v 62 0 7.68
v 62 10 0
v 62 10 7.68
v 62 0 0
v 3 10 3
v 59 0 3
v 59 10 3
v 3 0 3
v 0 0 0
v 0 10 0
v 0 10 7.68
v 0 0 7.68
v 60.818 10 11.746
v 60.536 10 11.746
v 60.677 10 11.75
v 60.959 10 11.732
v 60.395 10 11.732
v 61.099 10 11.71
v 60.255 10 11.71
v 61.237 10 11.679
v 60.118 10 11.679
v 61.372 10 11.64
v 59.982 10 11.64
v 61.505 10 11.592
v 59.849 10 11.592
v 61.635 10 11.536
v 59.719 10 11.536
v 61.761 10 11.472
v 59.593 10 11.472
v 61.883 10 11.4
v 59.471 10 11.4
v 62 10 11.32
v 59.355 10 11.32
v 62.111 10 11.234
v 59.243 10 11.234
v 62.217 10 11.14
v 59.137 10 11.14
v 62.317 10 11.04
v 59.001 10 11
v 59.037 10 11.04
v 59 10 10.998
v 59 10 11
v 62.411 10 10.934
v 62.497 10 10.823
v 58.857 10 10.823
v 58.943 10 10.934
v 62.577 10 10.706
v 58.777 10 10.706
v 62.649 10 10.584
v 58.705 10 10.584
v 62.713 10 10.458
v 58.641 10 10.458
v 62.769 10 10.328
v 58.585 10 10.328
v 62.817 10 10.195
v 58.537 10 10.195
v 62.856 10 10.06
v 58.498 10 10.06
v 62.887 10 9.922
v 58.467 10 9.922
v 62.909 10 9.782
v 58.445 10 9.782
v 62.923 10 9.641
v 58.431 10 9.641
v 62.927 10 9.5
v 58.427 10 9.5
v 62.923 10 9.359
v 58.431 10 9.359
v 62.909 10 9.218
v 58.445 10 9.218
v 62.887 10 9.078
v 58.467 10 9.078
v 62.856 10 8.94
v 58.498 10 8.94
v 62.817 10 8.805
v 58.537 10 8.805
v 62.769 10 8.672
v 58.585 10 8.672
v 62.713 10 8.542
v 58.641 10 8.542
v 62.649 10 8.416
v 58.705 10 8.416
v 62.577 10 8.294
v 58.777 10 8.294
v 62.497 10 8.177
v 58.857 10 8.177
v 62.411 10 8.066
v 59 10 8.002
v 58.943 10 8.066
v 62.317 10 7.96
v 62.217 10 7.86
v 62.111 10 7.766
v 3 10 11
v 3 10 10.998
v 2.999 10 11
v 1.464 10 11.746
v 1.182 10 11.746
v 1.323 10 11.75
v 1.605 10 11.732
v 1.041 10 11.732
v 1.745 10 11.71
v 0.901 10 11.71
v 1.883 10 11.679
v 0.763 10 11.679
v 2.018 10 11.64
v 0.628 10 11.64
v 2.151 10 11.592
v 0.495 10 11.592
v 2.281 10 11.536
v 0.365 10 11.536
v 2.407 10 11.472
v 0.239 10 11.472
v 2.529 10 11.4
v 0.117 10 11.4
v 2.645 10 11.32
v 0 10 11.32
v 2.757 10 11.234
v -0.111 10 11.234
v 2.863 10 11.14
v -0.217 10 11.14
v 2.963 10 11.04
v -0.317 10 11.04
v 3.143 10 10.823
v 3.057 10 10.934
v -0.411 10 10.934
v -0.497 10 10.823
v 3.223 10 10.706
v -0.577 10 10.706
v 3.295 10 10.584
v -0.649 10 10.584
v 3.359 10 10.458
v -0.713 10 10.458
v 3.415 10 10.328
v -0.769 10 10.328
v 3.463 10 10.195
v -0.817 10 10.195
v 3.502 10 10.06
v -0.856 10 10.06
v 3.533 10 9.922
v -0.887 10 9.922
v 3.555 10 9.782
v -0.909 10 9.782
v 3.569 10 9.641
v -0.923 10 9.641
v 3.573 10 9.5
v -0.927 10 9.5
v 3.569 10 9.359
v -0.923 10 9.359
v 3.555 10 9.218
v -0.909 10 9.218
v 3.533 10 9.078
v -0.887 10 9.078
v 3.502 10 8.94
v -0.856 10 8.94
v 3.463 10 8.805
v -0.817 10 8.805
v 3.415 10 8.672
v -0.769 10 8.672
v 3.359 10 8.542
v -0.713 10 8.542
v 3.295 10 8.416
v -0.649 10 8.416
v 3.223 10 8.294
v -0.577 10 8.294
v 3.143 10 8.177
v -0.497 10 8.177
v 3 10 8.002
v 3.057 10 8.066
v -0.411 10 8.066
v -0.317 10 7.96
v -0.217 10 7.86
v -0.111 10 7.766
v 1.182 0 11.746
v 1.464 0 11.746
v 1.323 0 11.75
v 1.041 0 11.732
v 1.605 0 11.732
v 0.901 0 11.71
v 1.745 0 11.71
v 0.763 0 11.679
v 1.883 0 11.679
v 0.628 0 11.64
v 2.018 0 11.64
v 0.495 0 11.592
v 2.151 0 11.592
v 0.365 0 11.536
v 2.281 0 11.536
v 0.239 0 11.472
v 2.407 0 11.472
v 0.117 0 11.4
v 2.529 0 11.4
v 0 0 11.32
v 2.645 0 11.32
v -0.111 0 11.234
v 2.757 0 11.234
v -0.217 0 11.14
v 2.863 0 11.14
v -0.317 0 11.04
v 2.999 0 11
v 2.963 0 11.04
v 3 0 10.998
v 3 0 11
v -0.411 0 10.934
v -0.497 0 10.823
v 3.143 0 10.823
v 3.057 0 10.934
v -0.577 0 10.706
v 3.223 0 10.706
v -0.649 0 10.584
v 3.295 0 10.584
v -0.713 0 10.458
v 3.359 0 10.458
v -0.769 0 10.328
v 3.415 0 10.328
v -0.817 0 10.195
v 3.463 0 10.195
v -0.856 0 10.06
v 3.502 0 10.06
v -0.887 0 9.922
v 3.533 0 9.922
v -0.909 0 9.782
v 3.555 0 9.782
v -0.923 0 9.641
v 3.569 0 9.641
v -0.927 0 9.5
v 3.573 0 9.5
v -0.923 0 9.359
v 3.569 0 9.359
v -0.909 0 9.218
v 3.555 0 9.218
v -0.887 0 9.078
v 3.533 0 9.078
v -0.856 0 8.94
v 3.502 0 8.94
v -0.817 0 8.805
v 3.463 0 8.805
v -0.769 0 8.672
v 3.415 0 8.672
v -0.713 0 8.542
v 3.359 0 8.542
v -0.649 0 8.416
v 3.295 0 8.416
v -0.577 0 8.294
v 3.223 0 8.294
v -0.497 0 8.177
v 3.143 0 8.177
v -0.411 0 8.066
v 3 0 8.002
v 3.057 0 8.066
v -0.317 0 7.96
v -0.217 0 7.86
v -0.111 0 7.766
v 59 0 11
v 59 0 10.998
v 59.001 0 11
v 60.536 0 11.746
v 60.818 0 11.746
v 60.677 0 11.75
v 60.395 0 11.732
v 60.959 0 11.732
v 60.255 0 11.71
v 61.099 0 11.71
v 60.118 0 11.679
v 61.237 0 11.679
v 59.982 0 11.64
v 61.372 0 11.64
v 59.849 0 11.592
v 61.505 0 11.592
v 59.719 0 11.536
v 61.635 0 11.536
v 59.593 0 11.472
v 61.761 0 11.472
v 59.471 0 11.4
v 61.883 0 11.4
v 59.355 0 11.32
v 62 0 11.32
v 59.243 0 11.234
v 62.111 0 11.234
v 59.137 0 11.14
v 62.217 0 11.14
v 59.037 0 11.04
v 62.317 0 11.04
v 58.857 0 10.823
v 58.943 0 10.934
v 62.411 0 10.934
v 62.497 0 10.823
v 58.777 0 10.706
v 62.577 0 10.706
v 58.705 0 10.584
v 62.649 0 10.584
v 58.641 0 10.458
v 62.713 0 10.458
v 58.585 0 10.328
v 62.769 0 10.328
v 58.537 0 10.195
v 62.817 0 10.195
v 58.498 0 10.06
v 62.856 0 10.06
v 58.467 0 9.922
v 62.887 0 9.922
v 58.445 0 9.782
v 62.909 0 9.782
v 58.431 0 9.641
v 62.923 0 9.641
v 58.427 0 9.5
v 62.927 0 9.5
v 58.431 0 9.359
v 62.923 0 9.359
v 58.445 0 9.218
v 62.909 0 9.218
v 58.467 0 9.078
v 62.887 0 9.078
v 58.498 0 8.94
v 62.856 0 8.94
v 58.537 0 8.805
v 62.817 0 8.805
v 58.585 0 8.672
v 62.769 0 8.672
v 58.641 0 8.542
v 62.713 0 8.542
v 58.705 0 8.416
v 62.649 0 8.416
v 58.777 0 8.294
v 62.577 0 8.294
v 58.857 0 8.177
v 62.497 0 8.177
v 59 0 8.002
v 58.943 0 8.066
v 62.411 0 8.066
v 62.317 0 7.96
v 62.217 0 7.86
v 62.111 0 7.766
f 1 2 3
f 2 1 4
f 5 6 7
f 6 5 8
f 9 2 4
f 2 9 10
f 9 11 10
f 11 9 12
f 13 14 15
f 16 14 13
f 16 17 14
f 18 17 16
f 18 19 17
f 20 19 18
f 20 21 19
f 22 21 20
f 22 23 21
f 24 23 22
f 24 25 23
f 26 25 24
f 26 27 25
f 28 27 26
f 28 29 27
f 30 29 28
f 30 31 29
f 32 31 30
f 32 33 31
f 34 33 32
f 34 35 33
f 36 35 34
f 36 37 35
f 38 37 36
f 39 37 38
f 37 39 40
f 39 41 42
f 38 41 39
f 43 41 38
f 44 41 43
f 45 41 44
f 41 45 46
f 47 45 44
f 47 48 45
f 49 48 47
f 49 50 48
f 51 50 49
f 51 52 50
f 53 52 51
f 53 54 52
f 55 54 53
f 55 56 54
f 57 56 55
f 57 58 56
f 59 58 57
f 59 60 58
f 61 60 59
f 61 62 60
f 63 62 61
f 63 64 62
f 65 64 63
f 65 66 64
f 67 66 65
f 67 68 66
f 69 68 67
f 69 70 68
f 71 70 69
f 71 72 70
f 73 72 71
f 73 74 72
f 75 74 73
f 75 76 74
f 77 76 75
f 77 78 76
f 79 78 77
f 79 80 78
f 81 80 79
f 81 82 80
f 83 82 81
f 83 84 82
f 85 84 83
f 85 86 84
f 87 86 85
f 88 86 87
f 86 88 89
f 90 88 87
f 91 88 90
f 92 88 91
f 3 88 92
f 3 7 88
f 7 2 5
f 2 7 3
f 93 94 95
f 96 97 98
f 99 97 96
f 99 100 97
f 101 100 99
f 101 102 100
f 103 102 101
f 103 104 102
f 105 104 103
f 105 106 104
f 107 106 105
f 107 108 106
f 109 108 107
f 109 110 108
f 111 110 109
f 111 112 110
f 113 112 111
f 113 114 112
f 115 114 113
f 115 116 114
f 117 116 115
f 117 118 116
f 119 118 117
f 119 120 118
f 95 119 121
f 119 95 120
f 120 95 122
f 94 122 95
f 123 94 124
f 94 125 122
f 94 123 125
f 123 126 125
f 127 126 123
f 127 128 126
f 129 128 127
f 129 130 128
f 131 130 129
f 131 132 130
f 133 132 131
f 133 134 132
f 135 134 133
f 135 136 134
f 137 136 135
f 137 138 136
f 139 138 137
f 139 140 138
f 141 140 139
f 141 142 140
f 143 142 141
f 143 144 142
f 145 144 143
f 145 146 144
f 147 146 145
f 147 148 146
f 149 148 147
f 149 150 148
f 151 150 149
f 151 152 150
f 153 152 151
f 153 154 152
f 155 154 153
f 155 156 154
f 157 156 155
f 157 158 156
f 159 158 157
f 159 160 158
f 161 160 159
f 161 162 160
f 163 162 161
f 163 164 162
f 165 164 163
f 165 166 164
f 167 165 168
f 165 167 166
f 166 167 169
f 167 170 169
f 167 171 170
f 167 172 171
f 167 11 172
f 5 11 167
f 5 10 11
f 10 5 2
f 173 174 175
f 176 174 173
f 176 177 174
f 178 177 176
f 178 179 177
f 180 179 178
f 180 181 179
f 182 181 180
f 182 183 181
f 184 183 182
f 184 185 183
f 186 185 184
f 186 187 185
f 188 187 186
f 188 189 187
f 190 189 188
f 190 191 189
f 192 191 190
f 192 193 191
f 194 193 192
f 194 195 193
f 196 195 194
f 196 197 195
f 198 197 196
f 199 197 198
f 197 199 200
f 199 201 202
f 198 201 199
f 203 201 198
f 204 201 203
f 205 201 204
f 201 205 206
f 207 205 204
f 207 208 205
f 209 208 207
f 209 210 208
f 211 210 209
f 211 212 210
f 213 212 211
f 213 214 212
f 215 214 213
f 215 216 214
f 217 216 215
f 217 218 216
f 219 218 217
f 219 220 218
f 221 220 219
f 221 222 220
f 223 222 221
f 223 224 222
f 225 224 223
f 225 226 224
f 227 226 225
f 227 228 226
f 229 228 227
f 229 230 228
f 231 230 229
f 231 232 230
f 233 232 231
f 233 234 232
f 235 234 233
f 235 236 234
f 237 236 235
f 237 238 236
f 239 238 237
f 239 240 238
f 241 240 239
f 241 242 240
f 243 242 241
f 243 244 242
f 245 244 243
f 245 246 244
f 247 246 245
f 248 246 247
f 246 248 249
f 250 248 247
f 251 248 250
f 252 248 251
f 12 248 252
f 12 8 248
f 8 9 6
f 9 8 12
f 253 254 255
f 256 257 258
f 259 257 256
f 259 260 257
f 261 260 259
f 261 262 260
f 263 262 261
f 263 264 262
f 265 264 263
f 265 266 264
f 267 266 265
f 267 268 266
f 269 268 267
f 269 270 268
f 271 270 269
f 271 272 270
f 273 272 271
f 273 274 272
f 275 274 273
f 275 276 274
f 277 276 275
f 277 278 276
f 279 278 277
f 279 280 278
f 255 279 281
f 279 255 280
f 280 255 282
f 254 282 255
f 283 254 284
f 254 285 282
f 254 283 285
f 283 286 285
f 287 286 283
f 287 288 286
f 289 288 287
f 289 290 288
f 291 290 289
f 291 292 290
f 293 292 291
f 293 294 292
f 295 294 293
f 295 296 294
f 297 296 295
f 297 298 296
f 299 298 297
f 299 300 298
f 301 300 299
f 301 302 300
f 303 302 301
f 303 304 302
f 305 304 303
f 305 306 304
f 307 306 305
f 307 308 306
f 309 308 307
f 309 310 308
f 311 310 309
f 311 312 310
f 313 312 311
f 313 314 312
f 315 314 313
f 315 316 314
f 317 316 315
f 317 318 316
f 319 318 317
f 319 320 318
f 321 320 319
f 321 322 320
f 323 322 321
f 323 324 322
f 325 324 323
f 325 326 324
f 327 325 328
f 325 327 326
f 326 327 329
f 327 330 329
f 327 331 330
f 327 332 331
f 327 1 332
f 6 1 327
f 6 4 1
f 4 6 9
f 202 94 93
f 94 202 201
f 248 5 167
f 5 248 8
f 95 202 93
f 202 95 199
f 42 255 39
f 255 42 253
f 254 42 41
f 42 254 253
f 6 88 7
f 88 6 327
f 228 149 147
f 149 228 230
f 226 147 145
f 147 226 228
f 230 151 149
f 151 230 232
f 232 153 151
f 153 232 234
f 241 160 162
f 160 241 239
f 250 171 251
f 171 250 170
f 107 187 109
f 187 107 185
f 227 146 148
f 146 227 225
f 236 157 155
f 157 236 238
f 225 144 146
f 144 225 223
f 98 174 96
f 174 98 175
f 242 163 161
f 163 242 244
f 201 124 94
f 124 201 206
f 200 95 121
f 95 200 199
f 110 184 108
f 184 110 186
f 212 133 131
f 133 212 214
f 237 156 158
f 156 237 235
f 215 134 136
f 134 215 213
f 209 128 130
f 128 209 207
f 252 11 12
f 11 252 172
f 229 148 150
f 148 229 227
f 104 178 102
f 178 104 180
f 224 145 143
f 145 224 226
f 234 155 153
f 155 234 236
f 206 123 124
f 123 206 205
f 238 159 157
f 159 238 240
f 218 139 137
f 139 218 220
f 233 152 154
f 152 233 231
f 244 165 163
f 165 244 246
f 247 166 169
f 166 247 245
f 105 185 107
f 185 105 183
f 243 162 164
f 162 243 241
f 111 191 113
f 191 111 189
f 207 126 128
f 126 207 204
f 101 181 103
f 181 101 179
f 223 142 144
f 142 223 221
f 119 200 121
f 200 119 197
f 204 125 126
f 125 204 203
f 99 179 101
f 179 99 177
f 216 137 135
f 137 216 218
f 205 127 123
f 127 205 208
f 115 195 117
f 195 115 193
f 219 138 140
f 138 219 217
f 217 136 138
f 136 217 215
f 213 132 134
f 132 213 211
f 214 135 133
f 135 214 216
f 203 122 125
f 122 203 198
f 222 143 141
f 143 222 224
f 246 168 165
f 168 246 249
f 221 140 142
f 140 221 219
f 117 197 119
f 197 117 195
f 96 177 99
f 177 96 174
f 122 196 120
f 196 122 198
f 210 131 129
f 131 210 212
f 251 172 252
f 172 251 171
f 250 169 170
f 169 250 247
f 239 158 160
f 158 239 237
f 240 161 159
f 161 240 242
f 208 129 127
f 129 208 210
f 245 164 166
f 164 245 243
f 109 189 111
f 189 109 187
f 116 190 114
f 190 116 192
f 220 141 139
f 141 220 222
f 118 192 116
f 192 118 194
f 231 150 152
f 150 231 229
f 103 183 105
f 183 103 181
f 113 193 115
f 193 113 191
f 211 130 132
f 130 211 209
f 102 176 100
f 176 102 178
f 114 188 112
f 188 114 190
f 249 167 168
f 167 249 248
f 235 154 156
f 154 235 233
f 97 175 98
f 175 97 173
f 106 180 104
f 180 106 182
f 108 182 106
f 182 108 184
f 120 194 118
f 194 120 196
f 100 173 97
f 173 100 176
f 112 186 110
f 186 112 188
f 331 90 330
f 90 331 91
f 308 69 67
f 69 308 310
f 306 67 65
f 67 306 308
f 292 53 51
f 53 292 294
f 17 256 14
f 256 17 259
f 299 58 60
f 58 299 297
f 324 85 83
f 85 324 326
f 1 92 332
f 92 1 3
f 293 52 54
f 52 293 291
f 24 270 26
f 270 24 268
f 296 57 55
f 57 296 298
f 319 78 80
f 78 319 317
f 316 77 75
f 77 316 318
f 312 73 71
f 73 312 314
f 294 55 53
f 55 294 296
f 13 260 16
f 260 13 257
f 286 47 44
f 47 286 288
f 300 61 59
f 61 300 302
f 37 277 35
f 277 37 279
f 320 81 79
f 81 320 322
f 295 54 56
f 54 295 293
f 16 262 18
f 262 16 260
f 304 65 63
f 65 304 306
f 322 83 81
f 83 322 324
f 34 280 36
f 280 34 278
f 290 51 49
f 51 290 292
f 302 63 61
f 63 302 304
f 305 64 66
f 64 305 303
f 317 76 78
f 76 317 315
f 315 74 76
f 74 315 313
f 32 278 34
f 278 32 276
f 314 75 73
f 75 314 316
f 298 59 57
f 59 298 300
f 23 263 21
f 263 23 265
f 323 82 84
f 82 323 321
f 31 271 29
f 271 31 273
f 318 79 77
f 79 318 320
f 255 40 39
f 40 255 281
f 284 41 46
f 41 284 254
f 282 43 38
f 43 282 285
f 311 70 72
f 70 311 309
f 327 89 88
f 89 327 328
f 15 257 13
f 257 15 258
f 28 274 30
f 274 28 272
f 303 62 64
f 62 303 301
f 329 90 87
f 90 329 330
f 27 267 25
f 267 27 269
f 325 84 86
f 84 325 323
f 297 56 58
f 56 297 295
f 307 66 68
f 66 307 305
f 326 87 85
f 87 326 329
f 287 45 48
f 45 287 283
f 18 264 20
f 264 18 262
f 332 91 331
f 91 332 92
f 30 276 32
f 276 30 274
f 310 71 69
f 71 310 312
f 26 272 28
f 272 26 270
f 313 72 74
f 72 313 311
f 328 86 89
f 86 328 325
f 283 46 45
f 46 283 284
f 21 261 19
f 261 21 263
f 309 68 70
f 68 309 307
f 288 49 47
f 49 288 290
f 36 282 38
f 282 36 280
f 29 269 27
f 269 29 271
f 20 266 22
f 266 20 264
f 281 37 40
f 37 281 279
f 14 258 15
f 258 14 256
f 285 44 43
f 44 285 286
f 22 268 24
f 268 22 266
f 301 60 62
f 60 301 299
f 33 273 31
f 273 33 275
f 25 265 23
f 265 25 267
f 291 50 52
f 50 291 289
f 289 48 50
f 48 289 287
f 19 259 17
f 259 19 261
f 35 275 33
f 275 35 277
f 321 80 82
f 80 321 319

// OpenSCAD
l_base = 55;
d_base = 5;
a_paredes = 3;
tol = 0.5;

cube( [ l_base + 2 * a_paredes + 2 * tol, 10, a_paredes ] );

cube( [ a_paredes, 10, 2 * a_paredes + d_base ] );
translate( [ l_base + a_paredes + 2 * tol, 0, 0 ] ) {
    cube( [ a_paredes, 10, 2 * a_paredes + d_base ] );
}

d_lombada = a_paredes * 1.5;

x_dis = 0.5 * sqrt( d_lombada ^ 2 - ( a_paredes ) ^ 2 );

translate( [ a_paredes - x_dis, 0, 2 * a_paredes + d_base - d_lombada / 2 + d_lombada / 2 - a_paredes / 2 ] )
    rotate( 90, [ -1, 0, 0 ] )
        cylinder( d = d_lombada, h = 10, $fn = 100 );

translate( [ l_base + 2 * a_paredes + 2 * tol - ( a_paredes - x_dis ), 0, 2 * a_paredes + d_base - d_lombada / 2 + d_lombada / 2 - a_paredes / 2 ] )
    rotate( 90, [ -1, 0, 0 ] )
        cylinder( d = d_lombada, h = 10, $fn = 100 );
